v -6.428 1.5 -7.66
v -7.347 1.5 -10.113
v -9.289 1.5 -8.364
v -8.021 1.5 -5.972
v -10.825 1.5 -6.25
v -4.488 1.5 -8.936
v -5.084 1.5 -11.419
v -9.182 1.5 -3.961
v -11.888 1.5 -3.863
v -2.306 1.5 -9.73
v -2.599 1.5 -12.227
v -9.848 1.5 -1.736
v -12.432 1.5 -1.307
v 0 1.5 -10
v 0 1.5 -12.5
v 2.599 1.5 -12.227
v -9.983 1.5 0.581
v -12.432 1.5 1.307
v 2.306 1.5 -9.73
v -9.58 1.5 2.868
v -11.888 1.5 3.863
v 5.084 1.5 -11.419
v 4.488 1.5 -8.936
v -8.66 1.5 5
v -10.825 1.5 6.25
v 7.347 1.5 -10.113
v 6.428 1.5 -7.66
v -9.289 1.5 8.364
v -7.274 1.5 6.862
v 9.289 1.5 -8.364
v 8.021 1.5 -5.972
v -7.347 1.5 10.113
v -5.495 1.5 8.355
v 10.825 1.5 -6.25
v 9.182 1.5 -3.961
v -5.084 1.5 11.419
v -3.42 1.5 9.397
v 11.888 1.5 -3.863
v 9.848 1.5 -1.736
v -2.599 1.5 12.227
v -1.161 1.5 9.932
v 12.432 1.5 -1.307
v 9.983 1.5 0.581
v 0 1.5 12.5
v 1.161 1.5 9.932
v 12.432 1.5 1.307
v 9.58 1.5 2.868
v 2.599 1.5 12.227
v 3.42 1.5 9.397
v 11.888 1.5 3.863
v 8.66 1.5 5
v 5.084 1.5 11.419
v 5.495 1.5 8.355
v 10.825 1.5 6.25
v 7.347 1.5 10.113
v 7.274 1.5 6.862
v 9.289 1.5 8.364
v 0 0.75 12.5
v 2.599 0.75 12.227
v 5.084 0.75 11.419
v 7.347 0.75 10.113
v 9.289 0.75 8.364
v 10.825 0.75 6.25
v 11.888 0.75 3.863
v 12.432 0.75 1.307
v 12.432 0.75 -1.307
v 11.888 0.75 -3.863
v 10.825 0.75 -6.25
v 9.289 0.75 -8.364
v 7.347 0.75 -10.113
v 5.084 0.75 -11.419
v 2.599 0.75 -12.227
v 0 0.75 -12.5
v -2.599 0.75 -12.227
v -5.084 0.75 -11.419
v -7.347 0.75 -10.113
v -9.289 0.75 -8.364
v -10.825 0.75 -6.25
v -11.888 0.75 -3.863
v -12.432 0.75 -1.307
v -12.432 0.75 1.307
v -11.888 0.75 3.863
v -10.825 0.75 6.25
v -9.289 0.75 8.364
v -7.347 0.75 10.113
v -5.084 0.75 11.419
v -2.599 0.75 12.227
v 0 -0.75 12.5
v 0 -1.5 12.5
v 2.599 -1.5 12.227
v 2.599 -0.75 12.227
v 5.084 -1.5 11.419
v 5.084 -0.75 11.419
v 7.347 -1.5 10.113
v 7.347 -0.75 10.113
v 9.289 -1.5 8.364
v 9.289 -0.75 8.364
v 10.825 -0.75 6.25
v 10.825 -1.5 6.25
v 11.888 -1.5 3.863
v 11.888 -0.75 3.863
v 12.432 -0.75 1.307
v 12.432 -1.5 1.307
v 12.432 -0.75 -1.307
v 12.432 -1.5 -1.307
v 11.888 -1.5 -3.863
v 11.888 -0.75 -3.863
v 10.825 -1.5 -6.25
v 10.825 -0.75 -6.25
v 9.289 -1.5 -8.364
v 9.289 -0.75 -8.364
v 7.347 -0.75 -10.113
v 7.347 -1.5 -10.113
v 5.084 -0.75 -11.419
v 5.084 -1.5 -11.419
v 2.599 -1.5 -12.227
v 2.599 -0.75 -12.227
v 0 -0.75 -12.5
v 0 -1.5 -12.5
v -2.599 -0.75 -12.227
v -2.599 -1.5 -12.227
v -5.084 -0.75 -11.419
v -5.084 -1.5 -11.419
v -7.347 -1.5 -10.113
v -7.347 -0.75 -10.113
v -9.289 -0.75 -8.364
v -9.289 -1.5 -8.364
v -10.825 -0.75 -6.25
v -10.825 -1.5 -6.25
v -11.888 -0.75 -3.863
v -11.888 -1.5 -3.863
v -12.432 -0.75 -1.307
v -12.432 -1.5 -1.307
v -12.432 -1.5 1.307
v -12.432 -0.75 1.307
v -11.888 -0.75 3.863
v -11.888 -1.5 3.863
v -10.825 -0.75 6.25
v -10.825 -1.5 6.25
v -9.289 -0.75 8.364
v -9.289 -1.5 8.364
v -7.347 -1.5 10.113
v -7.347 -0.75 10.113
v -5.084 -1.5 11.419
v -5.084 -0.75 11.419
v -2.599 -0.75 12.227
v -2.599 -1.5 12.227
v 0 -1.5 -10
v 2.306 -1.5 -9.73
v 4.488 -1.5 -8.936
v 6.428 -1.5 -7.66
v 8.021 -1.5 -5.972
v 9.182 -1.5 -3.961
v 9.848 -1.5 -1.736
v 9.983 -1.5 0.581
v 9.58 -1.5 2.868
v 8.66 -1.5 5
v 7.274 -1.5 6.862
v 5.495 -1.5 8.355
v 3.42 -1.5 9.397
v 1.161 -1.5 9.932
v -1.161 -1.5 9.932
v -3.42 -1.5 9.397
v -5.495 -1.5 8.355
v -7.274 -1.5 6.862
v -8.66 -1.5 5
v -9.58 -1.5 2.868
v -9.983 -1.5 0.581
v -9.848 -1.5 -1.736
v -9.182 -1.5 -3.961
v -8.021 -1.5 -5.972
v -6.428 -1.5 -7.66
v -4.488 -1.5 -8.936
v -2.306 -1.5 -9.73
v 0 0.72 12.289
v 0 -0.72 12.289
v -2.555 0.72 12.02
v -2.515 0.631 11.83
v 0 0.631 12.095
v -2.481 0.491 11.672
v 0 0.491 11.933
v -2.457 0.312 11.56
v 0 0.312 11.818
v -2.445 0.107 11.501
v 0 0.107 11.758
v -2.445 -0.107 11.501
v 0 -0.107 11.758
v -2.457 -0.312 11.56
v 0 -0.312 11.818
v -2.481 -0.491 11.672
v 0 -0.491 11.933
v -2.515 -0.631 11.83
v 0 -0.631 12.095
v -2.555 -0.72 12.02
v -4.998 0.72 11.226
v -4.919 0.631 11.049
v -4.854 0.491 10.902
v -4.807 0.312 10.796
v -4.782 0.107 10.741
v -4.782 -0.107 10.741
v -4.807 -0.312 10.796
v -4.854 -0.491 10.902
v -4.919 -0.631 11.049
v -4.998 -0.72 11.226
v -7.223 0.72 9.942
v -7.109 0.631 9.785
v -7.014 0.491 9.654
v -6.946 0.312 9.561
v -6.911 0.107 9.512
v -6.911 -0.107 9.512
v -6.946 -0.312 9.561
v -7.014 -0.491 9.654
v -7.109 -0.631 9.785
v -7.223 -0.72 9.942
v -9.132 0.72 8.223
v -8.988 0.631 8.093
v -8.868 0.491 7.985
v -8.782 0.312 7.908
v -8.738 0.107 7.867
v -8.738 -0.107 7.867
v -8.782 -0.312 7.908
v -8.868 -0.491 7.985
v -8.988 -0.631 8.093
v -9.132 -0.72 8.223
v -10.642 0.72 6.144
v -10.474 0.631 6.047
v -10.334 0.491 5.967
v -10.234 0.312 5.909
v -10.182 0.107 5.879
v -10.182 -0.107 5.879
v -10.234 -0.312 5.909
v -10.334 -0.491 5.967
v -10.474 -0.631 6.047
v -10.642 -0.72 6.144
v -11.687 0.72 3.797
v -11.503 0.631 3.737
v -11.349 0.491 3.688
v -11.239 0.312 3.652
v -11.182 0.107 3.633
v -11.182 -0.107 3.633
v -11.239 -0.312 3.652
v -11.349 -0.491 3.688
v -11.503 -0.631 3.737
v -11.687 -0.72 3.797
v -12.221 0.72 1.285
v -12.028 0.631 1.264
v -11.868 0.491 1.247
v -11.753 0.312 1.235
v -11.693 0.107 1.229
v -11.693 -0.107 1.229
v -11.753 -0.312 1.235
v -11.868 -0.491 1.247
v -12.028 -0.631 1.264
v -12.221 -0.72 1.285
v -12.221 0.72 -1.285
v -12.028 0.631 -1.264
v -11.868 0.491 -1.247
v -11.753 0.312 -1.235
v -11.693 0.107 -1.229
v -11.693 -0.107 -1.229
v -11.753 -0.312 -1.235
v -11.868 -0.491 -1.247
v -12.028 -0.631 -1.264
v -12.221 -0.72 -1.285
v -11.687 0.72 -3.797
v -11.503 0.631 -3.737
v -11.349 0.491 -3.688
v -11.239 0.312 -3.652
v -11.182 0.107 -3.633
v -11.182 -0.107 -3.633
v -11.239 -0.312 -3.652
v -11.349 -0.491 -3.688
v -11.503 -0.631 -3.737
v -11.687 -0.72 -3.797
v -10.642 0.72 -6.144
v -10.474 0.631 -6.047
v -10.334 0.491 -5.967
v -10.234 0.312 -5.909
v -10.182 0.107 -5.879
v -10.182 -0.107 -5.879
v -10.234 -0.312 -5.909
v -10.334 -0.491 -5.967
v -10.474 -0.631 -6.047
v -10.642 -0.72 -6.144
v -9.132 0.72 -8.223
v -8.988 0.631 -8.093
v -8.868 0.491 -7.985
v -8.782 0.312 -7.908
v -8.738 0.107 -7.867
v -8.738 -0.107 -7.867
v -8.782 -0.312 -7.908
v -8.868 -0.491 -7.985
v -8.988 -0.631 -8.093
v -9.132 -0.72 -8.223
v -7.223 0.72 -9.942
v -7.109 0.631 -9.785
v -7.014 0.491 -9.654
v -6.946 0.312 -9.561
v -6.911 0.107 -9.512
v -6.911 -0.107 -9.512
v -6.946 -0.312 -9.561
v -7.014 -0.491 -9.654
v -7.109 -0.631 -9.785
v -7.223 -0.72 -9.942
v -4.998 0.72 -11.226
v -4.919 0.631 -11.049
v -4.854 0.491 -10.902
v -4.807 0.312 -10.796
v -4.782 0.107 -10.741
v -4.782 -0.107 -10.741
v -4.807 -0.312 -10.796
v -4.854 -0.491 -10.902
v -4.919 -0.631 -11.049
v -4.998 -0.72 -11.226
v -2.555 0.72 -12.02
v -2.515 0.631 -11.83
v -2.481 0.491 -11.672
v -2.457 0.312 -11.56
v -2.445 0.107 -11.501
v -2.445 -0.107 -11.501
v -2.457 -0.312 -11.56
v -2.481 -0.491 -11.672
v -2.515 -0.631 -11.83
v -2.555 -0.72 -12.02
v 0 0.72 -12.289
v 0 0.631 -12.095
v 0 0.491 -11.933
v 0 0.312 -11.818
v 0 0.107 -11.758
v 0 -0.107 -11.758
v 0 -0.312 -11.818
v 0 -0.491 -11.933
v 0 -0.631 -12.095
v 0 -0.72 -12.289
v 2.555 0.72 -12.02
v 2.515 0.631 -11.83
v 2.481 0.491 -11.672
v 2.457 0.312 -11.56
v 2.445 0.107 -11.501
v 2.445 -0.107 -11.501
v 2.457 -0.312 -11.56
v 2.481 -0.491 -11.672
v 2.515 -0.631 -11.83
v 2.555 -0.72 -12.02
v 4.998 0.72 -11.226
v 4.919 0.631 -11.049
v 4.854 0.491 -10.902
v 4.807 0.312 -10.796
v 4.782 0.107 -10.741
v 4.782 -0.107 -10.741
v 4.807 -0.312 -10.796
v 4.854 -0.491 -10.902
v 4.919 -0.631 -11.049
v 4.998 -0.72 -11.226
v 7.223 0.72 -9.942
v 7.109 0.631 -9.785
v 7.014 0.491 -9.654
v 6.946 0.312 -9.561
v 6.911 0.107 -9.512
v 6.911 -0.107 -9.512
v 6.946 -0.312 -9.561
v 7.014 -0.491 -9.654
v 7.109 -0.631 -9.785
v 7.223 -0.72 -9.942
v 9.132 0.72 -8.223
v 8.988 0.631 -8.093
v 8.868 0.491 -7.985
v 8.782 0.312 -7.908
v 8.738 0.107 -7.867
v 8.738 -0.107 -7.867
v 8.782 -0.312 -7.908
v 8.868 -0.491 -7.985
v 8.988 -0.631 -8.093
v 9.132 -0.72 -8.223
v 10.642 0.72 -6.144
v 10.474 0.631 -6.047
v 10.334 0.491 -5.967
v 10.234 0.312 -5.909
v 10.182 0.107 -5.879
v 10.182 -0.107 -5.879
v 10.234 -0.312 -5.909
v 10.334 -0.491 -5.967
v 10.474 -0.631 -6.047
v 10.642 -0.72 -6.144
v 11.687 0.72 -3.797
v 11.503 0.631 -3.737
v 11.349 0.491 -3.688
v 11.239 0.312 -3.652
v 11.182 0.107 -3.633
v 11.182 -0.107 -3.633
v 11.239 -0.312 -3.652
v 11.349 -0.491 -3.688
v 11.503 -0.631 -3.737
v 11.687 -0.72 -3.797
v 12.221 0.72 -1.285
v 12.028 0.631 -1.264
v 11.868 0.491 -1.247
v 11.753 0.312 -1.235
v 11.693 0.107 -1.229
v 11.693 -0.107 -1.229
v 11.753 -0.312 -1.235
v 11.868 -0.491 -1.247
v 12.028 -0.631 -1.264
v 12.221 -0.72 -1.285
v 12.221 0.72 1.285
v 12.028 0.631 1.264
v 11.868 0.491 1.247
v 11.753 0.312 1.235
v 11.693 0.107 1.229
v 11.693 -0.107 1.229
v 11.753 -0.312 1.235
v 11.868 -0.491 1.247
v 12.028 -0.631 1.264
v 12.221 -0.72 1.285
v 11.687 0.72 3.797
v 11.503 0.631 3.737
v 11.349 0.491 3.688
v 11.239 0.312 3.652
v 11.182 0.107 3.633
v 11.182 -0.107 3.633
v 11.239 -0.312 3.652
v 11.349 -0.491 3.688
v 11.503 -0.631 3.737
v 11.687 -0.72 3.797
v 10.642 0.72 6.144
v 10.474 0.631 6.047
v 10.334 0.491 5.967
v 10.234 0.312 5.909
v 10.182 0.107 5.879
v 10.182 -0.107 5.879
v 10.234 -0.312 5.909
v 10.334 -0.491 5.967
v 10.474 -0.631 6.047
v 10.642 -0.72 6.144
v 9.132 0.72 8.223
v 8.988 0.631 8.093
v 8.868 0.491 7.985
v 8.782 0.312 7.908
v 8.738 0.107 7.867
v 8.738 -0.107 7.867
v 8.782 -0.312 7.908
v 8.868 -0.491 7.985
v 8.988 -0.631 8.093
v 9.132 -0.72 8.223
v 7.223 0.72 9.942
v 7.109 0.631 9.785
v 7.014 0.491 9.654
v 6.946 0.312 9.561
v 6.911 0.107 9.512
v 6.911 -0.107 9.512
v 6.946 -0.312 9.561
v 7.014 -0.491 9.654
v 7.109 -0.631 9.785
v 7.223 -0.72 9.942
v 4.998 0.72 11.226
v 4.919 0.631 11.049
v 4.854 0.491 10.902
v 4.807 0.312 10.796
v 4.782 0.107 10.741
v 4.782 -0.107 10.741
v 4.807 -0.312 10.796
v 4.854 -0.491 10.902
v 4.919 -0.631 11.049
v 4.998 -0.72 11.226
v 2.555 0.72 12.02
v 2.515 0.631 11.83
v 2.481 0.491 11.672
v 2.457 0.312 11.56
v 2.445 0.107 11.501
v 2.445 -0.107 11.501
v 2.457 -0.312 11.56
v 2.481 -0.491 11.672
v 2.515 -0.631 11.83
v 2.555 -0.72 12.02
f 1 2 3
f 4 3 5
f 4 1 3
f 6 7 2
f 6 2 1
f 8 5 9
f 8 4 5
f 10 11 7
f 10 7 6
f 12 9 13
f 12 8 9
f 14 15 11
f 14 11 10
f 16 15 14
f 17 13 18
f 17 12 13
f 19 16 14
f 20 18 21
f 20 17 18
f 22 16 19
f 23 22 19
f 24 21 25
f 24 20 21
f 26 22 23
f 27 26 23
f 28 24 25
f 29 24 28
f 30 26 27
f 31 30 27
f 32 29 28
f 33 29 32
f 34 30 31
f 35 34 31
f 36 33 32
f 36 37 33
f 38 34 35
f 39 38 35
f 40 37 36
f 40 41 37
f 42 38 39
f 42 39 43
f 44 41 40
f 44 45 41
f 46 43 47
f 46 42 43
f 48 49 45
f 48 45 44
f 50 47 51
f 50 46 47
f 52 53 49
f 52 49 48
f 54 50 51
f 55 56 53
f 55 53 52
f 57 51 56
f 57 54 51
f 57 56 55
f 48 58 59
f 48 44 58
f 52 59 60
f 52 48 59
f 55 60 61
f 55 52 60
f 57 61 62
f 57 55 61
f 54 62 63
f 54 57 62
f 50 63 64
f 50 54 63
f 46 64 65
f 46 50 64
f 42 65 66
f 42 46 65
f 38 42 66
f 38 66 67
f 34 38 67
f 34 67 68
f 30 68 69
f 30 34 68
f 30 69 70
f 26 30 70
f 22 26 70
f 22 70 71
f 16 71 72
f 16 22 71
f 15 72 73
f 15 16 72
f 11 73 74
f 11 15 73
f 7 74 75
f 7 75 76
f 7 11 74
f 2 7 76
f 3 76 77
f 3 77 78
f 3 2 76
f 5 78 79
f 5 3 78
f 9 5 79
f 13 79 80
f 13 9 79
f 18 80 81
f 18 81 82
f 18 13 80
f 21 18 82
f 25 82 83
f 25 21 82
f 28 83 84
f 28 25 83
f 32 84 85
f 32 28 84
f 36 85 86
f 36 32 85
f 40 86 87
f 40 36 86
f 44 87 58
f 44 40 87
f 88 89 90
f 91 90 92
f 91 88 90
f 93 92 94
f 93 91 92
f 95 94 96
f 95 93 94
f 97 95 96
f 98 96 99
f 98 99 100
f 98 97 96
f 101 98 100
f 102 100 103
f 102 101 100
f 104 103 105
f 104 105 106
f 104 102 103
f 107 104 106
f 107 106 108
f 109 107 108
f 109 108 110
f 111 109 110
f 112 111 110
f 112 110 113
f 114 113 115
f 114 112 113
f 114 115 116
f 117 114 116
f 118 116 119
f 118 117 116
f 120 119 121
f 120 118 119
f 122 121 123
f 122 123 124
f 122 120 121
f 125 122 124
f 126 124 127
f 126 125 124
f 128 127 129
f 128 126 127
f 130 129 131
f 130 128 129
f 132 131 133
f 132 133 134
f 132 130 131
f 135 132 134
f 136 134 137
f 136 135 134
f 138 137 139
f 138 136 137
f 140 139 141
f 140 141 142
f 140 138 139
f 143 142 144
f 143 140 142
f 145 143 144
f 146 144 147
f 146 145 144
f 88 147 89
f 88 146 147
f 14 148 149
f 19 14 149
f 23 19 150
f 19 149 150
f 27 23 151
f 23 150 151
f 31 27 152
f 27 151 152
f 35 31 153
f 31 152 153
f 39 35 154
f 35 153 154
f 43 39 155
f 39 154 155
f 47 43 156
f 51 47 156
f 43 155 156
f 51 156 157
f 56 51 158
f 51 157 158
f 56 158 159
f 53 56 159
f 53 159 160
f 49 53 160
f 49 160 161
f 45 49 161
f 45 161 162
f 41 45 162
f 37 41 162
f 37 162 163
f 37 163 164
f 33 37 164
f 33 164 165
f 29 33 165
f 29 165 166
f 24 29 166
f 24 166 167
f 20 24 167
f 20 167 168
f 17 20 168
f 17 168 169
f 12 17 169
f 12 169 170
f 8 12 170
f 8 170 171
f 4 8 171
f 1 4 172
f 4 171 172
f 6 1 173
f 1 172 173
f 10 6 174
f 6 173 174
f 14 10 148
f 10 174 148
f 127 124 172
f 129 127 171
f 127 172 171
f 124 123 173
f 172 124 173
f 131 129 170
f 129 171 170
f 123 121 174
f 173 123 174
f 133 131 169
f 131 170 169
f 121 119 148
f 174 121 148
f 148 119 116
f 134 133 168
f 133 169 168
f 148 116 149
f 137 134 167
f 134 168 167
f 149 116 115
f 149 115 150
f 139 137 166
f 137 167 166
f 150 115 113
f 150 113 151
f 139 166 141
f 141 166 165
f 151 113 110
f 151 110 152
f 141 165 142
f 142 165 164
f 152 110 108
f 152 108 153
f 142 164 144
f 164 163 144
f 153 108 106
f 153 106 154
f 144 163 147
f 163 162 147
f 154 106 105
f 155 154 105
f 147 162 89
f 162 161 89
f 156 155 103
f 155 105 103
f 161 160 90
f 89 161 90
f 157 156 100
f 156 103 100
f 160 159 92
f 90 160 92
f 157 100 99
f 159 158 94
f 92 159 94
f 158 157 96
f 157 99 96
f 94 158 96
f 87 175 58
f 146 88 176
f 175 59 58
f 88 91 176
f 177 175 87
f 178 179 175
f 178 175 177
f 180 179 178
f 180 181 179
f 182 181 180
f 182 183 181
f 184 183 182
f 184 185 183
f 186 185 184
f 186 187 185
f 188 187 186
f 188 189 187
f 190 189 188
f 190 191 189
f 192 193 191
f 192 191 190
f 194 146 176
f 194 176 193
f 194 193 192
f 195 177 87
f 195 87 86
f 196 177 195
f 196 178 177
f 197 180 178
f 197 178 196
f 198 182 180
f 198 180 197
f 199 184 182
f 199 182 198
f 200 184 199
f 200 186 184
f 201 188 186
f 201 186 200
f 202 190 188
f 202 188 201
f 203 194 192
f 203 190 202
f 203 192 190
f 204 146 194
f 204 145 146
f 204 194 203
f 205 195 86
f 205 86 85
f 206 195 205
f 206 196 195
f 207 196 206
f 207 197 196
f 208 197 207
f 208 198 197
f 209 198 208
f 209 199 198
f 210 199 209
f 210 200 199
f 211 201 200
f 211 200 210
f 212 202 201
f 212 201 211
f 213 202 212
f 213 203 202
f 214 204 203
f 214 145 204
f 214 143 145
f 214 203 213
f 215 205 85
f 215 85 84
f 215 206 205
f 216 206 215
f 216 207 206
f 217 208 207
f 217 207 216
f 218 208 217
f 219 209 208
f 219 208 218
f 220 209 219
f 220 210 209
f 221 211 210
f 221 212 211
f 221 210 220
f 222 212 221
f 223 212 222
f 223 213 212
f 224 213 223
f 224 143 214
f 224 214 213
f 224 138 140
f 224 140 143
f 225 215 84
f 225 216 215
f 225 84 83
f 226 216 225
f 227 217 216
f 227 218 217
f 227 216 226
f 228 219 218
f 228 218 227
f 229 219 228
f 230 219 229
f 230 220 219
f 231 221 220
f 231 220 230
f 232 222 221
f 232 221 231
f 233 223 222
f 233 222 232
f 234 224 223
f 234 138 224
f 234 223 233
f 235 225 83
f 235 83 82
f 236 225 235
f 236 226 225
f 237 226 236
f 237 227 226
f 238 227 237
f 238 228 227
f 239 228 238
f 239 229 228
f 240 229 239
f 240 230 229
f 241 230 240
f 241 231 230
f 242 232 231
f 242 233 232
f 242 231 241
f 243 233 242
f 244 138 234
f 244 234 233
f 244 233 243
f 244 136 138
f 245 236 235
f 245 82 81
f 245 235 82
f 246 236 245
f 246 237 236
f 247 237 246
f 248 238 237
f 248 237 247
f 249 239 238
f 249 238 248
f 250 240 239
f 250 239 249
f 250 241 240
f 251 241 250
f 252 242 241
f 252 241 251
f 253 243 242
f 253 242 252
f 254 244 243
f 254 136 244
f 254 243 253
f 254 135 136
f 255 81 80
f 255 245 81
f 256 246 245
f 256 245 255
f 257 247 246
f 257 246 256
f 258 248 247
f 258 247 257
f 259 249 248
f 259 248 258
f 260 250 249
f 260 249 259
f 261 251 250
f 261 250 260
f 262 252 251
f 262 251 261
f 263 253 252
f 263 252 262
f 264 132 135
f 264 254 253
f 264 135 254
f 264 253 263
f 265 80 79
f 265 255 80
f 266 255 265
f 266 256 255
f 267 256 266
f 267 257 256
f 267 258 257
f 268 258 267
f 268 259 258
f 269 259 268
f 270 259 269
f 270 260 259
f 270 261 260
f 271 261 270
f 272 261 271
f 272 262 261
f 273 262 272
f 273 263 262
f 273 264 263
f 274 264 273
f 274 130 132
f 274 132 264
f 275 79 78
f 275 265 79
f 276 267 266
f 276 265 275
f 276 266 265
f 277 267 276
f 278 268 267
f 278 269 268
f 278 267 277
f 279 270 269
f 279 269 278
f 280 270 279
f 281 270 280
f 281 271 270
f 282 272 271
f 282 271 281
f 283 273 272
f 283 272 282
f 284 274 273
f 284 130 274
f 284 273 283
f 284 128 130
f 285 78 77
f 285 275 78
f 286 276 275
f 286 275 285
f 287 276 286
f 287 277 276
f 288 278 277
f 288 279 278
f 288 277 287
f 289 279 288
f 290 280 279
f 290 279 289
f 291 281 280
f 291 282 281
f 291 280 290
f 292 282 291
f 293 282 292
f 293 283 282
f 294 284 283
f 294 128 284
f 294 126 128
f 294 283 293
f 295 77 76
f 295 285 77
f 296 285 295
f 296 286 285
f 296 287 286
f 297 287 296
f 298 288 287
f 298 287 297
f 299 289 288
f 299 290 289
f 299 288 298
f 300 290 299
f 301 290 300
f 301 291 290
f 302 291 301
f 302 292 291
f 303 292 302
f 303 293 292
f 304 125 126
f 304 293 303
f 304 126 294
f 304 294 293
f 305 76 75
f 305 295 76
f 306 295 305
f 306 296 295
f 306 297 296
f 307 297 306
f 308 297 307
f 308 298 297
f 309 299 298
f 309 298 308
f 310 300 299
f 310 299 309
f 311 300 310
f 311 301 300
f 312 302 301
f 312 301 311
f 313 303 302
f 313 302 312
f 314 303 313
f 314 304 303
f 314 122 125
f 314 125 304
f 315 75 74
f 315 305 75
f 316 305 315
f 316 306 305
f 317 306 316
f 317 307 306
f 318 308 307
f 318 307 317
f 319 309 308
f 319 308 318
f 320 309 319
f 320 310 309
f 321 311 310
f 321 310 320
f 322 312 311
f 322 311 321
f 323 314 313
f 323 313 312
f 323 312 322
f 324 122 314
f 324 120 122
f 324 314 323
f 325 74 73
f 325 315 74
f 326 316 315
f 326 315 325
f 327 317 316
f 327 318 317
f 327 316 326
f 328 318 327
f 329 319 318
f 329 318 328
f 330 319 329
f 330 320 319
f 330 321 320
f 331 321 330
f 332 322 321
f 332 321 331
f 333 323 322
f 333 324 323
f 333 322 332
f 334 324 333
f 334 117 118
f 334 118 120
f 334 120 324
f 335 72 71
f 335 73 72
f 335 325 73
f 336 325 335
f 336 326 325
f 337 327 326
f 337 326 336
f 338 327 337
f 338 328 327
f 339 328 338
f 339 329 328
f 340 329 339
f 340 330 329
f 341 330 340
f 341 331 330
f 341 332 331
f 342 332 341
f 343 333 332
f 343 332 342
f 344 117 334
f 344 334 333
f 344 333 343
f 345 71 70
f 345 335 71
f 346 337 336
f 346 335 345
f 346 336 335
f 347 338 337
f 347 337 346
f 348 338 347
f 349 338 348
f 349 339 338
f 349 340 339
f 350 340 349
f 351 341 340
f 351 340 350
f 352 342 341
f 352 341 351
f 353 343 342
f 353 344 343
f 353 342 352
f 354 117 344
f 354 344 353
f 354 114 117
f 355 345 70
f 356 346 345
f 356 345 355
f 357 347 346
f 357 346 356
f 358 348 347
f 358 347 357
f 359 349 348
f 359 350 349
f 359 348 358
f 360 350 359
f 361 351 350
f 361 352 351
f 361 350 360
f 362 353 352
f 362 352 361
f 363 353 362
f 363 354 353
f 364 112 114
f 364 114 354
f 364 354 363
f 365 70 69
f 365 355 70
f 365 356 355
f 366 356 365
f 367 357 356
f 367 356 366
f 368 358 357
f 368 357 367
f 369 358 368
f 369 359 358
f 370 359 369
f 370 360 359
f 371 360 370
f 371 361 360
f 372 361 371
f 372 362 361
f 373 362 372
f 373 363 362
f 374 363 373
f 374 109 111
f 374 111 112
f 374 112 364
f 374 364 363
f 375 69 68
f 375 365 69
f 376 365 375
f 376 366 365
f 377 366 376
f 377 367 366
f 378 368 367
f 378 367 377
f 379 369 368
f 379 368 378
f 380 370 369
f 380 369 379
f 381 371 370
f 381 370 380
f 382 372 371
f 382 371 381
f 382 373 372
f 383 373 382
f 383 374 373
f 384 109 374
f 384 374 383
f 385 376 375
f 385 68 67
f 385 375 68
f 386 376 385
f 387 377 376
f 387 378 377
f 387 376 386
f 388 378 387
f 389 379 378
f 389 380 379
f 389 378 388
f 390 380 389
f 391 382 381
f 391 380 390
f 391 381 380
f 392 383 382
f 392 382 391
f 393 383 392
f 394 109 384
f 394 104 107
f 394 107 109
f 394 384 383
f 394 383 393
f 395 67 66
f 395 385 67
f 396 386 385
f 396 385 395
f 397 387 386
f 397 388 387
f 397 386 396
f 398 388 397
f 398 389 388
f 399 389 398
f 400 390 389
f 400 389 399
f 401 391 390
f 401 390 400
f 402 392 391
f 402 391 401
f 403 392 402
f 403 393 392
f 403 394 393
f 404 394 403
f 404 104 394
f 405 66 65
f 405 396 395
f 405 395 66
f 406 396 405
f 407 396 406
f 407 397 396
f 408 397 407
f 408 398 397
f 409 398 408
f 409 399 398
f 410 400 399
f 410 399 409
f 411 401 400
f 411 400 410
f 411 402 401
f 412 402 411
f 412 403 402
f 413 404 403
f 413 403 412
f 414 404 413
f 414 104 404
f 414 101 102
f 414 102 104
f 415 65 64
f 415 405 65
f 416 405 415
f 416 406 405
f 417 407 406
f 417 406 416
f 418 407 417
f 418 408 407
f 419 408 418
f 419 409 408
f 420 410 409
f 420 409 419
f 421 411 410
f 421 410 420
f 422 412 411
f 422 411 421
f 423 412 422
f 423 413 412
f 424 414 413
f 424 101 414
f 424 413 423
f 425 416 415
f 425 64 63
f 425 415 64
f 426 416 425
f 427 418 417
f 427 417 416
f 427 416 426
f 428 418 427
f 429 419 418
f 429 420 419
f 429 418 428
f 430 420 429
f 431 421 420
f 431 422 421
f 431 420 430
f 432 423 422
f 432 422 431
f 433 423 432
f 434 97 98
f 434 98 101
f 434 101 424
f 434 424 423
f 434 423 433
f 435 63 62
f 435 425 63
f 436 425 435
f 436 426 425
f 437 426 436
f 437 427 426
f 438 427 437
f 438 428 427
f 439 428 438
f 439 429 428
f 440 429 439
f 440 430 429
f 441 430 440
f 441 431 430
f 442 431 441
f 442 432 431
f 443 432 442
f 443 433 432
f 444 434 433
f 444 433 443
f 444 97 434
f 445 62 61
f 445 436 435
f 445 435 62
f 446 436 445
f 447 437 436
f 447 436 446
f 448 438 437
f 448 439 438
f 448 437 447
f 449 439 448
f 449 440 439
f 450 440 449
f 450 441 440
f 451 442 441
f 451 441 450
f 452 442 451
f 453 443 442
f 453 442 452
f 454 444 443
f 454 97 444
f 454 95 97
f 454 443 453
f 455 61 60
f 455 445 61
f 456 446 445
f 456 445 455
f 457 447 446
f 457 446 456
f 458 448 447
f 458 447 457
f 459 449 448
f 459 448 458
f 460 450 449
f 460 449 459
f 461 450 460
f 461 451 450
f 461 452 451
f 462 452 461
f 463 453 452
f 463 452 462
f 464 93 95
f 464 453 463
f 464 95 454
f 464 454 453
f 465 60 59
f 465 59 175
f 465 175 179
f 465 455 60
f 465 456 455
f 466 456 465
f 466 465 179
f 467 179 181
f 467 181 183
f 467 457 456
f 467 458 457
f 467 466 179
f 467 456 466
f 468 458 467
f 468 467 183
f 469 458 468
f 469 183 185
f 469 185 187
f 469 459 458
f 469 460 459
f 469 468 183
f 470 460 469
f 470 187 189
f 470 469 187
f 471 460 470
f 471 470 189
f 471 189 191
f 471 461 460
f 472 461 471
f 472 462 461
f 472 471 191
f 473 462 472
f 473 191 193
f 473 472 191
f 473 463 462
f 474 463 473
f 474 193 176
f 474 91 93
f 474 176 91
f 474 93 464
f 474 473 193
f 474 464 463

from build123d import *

# Parameters (mm, degrees)
CROQUIS1_R              = 12.5
SALIENTE_EXTRUIR1_DEPTH = 1.5
CROQUIS2_R              = 0.75
CROQUIS4_R              = 10
CORTAR_EXTRUIR1_DEPTH   = 18.930421077


with BuildPart() as part:
    # Croquis1 → Saliente-Extruir1 (new, symmetric)
    with BuildSketch(Plane(origin=(0, 0, 0), x_dir=(1, 0, 0), z_dir=(0, 1, 0))):
        with Locations(Location((0, 0, 0), (0, 0, 270))):
            Circle(CROQUIS1_R)
    extrude(amount=SALIENTE_EXTRUIR1_DEPTH, both=True)

    # Croquis2 → Cortar-Revolución1 (revolve, cut)
    with BuildSketch(Plane(origin=(0, 0, 0), x_dir=(0, 0, -1), z_dir=(1, 0, 0)), mode=Mode.PRIVATE) as cortar_revoluci_n1_sk:
        with Locations((12.5, 0)):
            Circle(CROQUIS2_R)
    revolve(cortar_revoluci_n1_sk.sketch.rotate(Axis((0, 1.5, 0), (0, -1, 0)), 180), axis=Axis((0, 1.5, 0), (0, -1, 0)), mode=Mode.SUBTRACT)

    # Croquis4 → Cortar-Extruir1 (cut, through all)
    with BuildSketch(Plane.XZ.offset(1.5)):
        with Locations(Location((0, 0, 0), (0, 0, 270))):
            Circle(CROQUIS4_R)
    extrude(amount=-CORTAR_EXTRUIR1_DEPTH, mode=Mode.SUBTRACT)


solid = part.part
